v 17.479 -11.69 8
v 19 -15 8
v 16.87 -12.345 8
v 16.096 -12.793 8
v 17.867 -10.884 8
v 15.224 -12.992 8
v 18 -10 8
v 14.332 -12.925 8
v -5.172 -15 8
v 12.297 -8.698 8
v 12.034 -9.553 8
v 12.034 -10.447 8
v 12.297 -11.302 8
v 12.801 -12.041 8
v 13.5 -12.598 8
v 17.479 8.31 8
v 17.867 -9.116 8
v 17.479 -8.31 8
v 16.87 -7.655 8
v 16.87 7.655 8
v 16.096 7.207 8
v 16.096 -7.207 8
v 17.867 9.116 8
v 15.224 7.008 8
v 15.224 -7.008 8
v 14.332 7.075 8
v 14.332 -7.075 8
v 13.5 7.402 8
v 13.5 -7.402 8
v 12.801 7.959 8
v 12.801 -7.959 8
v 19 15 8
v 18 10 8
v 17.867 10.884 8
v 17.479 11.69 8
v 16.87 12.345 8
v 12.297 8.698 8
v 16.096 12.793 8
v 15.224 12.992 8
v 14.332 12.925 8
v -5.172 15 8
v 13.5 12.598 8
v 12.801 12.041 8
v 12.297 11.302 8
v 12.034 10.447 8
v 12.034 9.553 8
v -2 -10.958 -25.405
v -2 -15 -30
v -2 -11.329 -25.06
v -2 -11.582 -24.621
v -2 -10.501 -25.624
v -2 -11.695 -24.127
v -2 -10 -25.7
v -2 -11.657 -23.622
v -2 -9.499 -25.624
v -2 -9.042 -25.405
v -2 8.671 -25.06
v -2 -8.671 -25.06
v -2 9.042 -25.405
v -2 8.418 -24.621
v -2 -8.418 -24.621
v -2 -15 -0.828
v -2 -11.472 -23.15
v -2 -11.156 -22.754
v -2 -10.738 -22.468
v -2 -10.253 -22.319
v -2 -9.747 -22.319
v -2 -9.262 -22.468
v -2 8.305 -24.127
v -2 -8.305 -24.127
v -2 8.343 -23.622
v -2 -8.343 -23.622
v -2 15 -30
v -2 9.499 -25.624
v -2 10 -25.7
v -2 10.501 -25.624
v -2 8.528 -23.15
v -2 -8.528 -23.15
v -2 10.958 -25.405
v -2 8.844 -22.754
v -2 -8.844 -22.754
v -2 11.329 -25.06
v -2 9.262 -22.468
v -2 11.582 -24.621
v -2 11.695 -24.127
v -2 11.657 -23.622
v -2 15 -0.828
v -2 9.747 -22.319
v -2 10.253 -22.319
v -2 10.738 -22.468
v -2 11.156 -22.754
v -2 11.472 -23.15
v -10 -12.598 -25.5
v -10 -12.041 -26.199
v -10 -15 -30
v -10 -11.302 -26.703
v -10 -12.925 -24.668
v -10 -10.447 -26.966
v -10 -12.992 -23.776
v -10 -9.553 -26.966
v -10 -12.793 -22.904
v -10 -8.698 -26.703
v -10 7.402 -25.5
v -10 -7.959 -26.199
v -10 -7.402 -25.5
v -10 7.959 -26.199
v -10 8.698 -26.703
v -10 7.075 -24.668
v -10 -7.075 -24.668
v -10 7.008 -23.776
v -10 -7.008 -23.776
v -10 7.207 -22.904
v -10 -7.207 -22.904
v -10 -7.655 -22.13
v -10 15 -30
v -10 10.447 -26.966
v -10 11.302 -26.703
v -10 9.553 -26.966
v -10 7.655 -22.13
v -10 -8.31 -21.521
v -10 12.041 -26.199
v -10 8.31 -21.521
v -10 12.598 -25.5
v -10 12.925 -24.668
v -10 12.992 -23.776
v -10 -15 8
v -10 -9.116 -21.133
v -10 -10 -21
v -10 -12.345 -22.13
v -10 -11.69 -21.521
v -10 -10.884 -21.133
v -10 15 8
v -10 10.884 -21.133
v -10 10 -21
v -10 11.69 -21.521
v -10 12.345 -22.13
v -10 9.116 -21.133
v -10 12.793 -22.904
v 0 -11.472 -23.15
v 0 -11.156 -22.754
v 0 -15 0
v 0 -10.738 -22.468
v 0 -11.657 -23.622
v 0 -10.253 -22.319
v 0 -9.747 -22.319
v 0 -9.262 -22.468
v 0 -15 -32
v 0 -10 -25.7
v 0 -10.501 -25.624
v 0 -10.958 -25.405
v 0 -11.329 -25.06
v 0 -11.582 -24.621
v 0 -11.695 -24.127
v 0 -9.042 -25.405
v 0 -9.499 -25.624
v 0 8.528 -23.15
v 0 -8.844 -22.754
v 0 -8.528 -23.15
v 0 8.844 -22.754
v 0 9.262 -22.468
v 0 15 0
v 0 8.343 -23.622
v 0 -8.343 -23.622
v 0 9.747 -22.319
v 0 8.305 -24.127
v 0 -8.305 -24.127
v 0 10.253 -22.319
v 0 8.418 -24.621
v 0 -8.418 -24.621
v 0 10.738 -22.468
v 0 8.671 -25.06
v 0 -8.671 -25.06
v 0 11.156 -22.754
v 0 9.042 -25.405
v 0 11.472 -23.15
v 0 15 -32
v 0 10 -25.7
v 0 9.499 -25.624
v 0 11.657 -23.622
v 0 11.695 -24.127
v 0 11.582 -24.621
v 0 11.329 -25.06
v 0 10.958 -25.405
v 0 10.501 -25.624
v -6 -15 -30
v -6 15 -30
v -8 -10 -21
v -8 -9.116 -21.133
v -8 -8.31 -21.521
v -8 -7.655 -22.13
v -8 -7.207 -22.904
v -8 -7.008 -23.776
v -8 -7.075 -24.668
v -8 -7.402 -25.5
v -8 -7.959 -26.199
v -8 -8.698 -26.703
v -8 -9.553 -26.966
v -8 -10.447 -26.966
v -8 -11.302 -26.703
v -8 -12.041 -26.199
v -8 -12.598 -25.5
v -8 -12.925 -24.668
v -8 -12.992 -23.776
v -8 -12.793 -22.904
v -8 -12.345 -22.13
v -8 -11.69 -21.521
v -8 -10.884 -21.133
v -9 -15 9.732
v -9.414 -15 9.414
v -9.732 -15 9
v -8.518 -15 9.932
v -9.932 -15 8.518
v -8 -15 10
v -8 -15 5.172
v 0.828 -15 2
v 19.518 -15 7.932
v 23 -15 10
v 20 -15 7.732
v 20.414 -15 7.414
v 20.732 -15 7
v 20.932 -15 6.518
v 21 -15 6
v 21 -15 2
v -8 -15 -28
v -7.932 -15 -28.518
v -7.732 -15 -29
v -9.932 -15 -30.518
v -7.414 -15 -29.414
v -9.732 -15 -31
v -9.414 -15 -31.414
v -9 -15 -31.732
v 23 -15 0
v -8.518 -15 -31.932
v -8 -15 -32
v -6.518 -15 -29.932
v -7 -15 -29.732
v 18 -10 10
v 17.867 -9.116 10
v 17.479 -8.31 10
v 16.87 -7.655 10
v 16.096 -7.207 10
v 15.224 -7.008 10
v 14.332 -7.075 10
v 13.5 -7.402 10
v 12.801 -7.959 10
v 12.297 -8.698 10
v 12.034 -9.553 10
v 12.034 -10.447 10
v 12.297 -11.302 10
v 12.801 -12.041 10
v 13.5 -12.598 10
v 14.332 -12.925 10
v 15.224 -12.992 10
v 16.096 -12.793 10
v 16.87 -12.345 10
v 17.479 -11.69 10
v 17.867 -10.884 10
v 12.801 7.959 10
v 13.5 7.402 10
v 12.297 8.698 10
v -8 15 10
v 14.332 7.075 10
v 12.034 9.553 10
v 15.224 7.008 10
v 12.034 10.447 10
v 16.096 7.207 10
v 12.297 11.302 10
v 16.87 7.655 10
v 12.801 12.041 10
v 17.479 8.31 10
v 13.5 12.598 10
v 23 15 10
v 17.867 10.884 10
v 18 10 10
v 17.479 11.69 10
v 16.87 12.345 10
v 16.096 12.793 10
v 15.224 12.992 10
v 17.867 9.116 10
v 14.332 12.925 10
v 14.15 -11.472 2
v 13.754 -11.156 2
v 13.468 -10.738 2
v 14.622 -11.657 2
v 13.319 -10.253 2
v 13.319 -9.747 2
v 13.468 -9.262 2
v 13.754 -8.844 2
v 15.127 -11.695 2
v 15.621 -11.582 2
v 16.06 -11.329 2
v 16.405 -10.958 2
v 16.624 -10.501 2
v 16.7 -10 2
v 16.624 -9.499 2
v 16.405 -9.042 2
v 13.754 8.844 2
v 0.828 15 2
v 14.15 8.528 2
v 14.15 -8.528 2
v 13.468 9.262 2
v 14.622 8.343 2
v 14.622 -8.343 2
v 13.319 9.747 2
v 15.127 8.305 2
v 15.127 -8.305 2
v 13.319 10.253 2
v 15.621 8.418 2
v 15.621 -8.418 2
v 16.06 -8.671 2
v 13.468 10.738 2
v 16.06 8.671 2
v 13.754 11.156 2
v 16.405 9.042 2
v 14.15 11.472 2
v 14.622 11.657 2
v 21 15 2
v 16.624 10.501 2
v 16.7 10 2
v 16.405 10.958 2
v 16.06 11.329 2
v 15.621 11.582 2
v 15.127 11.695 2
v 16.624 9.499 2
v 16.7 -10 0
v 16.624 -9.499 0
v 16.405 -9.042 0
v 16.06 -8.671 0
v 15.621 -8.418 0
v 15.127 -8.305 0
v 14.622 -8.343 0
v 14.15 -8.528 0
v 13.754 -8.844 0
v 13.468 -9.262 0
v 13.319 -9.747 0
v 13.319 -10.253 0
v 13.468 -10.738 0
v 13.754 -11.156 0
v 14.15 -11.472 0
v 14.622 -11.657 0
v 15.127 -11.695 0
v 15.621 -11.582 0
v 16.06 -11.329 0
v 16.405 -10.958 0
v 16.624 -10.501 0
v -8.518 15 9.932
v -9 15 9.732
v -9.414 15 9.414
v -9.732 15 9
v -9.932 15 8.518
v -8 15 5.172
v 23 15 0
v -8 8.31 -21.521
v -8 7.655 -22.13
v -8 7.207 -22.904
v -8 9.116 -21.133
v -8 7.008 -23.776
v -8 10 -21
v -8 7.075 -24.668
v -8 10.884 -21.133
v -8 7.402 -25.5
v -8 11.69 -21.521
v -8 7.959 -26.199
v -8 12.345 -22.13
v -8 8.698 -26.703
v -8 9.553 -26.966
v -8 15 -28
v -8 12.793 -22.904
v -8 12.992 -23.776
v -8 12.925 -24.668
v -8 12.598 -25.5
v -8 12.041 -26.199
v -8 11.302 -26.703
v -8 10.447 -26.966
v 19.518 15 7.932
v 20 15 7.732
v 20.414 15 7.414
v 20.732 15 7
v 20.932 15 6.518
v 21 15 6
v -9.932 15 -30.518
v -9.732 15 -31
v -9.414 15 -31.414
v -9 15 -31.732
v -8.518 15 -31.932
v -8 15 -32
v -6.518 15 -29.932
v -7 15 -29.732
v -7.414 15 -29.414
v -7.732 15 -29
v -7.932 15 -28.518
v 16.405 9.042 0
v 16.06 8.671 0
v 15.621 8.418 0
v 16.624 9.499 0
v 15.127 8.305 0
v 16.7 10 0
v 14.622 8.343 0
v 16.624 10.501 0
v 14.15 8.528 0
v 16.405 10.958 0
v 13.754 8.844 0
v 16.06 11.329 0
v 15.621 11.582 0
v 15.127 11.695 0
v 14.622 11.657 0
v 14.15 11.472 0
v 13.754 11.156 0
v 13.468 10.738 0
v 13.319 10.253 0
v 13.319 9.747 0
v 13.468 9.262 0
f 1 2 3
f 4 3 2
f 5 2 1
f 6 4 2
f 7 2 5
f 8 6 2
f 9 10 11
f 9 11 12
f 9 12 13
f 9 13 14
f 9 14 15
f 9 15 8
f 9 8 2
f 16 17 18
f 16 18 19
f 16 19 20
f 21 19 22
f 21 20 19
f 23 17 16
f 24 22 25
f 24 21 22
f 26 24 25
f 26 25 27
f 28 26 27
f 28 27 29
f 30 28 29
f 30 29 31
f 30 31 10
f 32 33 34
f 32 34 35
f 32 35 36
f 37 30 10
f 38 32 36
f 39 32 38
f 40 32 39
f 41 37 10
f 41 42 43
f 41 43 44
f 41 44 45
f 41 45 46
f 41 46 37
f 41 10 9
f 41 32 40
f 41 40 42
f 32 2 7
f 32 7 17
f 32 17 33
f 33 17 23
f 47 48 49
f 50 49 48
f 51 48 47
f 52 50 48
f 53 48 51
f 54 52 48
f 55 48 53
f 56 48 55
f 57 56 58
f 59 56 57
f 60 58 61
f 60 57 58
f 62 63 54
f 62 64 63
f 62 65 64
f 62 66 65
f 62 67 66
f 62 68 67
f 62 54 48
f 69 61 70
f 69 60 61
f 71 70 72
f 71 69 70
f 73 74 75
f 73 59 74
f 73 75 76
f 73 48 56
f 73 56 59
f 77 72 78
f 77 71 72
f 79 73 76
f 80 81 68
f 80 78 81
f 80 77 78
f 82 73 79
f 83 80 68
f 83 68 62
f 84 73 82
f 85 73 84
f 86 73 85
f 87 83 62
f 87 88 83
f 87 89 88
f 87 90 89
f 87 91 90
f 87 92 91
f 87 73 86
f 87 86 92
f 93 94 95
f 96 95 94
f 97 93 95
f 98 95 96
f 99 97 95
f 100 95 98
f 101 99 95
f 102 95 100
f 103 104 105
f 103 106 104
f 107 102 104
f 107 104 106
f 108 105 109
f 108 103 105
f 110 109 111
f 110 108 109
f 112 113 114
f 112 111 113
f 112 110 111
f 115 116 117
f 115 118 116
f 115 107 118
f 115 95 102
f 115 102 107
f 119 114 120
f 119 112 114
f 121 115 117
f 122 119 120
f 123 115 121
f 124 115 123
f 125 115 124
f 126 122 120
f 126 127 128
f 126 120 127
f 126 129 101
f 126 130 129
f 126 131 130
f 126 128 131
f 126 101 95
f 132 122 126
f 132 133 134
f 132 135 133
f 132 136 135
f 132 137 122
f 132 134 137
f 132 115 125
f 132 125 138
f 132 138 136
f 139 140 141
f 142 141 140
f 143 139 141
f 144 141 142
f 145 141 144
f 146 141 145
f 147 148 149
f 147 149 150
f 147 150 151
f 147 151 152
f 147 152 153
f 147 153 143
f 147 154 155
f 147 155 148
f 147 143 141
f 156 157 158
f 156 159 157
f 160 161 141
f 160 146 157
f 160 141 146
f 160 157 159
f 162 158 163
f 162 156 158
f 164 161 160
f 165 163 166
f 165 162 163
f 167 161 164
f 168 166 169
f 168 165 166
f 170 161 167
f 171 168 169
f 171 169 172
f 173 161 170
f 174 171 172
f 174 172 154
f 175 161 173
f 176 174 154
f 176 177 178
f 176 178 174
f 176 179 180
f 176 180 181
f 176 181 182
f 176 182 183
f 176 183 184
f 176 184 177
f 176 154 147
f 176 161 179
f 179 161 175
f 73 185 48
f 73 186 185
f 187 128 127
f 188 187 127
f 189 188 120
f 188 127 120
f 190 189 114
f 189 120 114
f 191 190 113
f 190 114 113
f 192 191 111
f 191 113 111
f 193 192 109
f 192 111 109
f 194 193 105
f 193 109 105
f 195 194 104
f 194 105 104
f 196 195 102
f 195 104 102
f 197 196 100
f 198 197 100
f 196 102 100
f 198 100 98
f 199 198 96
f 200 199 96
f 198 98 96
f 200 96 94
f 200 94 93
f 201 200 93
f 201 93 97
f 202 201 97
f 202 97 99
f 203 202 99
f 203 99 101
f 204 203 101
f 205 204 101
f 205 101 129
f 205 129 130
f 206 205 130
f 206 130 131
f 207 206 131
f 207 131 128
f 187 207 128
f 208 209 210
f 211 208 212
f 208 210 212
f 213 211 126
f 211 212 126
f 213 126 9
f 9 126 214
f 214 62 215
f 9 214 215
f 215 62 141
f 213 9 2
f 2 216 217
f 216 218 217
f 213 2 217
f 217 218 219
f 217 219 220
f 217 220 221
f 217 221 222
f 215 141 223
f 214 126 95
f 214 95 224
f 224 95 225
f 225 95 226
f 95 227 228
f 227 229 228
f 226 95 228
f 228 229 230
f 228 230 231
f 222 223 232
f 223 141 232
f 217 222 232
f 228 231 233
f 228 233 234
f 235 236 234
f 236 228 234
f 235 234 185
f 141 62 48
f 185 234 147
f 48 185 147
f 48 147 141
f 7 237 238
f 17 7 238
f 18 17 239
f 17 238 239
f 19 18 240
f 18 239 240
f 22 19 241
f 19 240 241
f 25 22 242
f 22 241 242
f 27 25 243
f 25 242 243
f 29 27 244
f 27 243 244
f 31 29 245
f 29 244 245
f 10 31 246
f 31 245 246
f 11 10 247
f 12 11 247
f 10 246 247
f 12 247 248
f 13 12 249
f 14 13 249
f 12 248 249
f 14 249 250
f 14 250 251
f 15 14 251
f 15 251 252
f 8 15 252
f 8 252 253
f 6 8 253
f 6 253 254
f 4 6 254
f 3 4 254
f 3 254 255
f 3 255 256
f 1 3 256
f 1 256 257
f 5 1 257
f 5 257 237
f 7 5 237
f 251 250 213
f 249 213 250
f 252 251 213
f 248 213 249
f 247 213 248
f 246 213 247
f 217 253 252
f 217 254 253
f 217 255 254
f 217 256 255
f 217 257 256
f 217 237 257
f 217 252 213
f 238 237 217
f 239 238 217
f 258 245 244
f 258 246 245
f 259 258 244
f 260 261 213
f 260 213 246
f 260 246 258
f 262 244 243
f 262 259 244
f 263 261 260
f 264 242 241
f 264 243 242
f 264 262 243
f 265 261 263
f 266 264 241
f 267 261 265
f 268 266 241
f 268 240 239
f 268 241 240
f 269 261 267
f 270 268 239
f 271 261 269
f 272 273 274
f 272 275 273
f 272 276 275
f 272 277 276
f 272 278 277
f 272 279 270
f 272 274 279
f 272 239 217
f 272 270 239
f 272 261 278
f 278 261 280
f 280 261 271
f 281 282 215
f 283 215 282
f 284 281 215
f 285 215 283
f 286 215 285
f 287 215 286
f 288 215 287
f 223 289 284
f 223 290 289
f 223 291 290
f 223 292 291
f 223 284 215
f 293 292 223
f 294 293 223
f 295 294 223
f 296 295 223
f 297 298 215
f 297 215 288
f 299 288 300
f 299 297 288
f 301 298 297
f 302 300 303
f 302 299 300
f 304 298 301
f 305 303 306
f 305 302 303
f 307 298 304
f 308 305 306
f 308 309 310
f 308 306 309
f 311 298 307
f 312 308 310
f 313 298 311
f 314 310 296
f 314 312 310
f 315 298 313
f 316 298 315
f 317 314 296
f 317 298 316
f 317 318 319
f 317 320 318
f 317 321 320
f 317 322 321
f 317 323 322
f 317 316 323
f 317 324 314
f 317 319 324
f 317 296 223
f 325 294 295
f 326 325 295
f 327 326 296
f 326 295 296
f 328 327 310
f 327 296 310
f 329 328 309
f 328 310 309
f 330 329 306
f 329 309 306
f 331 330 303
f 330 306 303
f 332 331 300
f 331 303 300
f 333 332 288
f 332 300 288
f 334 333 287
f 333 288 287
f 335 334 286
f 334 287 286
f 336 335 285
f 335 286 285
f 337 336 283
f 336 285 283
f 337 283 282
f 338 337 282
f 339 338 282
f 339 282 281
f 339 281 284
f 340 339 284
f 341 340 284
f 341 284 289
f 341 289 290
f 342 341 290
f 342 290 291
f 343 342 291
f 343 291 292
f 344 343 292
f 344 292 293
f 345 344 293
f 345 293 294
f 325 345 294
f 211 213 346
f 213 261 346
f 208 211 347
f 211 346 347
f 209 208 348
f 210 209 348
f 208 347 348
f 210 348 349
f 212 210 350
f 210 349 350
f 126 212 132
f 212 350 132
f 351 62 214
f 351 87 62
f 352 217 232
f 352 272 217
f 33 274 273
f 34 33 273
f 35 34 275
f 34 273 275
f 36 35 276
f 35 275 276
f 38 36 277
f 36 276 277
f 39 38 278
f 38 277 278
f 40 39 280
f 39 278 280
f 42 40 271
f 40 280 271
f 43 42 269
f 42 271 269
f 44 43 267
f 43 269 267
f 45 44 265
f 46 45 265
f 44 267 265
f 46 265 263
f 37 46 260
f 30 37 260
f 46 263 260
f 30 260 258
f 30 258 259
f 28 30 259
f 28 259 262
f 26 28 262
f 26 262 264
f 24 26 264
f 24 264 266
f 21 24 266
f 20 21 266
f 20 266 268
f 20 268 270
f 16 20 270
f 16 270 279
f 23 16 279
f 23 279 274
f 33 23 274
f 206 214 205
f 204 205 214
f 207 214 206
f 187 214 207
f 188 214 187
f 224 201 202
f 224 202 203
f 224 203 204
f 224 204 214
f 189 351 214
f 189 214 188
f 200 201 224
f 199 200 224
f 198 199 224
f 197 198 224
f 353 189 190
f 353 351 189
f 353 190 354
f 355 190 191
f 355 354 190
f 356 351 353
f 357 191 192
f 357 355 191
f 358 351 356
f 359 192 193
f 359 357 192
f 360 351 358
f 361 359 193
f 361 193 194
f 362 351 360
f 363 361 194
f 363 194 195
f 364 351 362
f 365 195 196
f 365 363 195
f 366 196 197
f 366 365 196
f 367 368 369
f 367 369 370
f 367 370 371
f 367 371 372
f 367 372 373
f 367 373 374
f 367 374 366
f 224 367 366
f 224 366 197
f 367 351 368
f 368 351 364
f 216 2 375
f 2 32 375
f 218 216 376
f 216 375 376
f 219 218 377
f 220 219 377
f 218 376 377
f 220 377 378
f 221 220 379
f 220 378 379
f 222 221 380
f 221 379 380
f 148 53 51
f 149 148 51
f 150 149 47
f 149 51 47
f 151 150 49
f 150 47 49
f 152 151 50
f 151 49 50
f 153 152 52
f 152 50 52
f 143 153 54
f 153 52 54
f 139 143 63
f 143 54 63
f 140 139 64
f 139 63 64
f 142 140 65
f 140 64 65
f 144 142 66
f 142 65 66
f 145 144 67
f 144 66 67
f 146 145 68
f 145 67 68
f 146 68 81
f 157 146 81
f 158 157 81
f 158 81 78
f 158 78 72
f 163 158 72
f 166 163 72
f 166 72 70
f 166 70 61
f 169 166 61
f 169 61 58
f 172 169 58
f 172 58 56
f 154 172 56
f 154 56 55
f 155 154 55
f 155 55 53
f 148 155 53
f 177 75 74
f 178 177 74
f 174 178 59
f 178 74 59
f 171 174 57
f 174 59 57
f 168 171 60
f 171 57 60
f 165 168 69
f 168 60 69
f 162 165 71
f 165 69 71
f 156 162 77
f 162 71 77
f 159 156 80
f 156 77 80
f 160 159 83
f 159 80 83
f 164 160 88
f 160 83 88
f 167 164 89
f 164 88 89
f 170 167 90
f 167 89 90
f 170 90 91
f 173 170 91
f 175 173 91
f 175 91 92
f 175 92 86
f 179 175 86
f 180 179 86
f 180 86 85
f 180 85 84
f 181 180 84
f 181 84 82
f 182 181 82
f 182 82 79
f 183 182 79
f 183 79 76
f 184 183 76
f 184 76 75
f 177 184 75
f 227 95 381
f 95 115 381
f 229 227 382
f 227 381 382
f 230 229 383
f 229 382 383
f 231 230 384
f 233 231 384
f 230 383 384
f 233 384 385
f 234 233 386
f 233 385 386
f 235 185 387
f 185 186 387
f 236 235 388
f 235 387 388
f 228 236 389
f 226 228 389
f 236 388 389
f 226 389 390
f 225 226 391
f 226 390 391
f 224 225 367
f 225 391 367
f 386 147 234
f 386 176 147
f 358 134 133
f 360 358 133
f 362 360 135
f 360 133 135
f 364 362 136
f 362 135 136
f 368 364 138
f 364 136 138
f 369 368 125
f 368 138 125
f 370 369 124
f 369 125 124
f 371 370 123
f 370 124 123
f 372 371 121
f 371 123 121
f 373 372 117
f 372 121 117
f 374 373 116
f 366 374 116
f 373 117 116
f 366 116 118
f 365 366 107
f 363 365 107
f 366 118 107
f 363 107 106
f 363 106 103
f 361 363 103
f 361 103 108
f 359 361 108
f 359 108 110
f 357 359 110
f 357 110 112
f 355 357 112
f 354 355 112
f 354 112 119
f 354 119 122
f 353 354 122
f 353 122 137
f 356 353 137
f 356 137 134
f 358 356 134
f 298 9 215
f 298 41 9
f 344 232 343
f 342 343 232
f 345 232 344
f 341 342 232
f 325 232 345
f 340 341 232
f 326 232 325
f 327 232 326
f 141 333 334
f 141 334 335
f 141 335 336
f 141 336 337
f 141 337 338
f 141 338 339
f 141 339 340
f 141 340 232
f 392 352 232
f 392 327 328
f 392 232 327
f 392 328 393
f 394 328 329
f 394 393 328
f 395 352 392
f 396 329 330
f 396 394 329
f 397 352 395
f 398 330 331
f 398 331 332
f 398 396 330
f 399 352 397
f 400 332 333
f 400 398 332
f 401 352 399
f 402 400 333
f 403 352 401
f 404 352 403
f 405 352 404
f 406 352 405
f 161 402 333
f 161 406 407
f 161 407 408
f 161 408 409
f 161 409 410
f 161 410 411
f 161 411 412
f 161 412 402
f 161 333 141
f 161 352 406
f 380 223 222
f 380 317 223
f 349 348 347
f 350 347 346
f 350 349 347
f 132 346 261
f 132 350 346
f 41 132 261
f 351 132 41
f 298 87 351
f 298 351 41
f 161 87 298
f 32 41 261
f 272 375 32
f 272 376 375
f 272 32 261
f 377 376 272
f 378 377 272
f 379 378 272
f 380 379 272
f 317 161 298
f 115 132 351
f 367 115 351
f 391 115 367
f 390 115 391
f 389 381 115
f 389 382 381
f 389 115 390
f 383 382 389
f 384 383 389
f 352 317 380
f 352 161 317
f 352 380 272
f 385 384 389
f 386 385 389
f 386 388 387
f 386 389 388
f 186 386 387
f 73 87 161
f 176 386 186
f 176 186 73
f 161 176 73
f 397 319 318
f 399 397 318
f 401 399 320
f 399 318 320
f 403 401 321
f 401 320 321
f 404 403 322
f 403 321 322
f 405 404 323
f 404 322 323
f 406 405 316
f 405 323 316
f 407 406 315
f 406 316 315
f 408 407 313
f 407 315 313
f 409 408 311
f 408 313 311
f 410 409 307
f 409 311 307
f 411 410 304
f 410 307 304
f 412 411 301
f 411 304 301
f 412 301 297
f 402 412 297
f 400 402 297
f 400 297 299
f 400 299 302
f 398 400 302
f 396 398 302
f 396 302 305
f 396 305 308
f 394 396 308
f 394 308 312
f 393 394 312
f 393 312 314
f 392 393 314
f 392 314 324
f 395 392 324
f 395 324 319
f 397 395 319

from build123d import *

# Parameters (mm, degrees)
BOSS_EXTRUDE1_DEPTH            = 15
FILLET1_R                      = 2
M3_CLEARANCE_HOLE1_D           = 3.4
M3_CLEARANCE_HOLE1_ON_FACE_2_D = 3.4
SKETCH3_R                      = 3
CUT_EXTRUDE1_DEPTH             = 8
SKETCH4_R                      = 3
CUT_EXTRUDE2_DEPTH             = 8


with BuildPart() as part:
    # Sketch1 → Boss-Extrude1 (new body, symmetric)
    with BuildSketch(Plane(origin=(0, 0, 0), x_dir=(1, 0, 0), z_dir=(0, 1, 0))):
        Polygon((0, 0), (0, 32), (-10, 32), (-10, -10), (23, -10), (23, 0), align=None)
        Polygon((-8, 30), (-2, 30), (-2, 0.828427125), (-8, -5.171572875), align=None, mode=Mode.SUBTRACT)
        Polygon((21, -8), (-5.171572875, -8), (0.828427125, -2), (21, -2), align=None, mode=Mode.SUBTRACT)
    extrude(amount=BOSS_EXTRUDE1_DEPTH, both=True)

    # Fillet1
    fillet1_edges = [part.edges().sort_by_distance(p)[0] for p in [
        (-10, 0, 10),
        (-10, 0, -32),
        (21, 0, 8),
        (-8, 0, -30),
    ]]
    fillet(fillet1_edges, radius=FILLET1_R)

    # M3 Clearance Hole1 (through all)
    with Locations(Plane(origin=(15, -10, 0), x_dir=(-1, 0, 0), z_dir=(0, 0, -1))):
        with Locations((0, 0), (0, 20)):
            Hole(M3_CLEARANCE_HOLE1_D / 2)

    # M3 Clearance Hole1 on face 2 (through all)
    with Locations(Plane(origin=(0, 10, -24), x_dir=(0, 0, 1), z_dir=(1, 0, 0))):
        with Locations((0, 0), (0, 20)):
            Hole(M3_CLEARANCE_HOLE1_ON_FACE_2_D / 2)

    # Sketch3 → Cut-Extrude1 (cut)
    with BuildSketch(Plane.ZY.offset(10)):
        with Locations((-24, 10)):
            Circle(SKETCH3_R)
        with Locations((-24, -10)):
            Circle(SKETCH3_R)
    extrude(amount=-CUT_EXTRUDE1_DEPTH, mode=Mode.SUBTRACT)

    # Sketch4 → Cut-Extrude2 (cut)
    with BuildSketch(Plane.XY.offset(10)):
        with Locations((15, 10)):
            Circle(SKETCH4_R)
        with Locations((15, -10)):
            Circle(SKETCH4_R)
    extrude(amount=-CUT_EXTRUDE2_DEPTH, mode=Mode.SUBTRACT)


solid = part.part
